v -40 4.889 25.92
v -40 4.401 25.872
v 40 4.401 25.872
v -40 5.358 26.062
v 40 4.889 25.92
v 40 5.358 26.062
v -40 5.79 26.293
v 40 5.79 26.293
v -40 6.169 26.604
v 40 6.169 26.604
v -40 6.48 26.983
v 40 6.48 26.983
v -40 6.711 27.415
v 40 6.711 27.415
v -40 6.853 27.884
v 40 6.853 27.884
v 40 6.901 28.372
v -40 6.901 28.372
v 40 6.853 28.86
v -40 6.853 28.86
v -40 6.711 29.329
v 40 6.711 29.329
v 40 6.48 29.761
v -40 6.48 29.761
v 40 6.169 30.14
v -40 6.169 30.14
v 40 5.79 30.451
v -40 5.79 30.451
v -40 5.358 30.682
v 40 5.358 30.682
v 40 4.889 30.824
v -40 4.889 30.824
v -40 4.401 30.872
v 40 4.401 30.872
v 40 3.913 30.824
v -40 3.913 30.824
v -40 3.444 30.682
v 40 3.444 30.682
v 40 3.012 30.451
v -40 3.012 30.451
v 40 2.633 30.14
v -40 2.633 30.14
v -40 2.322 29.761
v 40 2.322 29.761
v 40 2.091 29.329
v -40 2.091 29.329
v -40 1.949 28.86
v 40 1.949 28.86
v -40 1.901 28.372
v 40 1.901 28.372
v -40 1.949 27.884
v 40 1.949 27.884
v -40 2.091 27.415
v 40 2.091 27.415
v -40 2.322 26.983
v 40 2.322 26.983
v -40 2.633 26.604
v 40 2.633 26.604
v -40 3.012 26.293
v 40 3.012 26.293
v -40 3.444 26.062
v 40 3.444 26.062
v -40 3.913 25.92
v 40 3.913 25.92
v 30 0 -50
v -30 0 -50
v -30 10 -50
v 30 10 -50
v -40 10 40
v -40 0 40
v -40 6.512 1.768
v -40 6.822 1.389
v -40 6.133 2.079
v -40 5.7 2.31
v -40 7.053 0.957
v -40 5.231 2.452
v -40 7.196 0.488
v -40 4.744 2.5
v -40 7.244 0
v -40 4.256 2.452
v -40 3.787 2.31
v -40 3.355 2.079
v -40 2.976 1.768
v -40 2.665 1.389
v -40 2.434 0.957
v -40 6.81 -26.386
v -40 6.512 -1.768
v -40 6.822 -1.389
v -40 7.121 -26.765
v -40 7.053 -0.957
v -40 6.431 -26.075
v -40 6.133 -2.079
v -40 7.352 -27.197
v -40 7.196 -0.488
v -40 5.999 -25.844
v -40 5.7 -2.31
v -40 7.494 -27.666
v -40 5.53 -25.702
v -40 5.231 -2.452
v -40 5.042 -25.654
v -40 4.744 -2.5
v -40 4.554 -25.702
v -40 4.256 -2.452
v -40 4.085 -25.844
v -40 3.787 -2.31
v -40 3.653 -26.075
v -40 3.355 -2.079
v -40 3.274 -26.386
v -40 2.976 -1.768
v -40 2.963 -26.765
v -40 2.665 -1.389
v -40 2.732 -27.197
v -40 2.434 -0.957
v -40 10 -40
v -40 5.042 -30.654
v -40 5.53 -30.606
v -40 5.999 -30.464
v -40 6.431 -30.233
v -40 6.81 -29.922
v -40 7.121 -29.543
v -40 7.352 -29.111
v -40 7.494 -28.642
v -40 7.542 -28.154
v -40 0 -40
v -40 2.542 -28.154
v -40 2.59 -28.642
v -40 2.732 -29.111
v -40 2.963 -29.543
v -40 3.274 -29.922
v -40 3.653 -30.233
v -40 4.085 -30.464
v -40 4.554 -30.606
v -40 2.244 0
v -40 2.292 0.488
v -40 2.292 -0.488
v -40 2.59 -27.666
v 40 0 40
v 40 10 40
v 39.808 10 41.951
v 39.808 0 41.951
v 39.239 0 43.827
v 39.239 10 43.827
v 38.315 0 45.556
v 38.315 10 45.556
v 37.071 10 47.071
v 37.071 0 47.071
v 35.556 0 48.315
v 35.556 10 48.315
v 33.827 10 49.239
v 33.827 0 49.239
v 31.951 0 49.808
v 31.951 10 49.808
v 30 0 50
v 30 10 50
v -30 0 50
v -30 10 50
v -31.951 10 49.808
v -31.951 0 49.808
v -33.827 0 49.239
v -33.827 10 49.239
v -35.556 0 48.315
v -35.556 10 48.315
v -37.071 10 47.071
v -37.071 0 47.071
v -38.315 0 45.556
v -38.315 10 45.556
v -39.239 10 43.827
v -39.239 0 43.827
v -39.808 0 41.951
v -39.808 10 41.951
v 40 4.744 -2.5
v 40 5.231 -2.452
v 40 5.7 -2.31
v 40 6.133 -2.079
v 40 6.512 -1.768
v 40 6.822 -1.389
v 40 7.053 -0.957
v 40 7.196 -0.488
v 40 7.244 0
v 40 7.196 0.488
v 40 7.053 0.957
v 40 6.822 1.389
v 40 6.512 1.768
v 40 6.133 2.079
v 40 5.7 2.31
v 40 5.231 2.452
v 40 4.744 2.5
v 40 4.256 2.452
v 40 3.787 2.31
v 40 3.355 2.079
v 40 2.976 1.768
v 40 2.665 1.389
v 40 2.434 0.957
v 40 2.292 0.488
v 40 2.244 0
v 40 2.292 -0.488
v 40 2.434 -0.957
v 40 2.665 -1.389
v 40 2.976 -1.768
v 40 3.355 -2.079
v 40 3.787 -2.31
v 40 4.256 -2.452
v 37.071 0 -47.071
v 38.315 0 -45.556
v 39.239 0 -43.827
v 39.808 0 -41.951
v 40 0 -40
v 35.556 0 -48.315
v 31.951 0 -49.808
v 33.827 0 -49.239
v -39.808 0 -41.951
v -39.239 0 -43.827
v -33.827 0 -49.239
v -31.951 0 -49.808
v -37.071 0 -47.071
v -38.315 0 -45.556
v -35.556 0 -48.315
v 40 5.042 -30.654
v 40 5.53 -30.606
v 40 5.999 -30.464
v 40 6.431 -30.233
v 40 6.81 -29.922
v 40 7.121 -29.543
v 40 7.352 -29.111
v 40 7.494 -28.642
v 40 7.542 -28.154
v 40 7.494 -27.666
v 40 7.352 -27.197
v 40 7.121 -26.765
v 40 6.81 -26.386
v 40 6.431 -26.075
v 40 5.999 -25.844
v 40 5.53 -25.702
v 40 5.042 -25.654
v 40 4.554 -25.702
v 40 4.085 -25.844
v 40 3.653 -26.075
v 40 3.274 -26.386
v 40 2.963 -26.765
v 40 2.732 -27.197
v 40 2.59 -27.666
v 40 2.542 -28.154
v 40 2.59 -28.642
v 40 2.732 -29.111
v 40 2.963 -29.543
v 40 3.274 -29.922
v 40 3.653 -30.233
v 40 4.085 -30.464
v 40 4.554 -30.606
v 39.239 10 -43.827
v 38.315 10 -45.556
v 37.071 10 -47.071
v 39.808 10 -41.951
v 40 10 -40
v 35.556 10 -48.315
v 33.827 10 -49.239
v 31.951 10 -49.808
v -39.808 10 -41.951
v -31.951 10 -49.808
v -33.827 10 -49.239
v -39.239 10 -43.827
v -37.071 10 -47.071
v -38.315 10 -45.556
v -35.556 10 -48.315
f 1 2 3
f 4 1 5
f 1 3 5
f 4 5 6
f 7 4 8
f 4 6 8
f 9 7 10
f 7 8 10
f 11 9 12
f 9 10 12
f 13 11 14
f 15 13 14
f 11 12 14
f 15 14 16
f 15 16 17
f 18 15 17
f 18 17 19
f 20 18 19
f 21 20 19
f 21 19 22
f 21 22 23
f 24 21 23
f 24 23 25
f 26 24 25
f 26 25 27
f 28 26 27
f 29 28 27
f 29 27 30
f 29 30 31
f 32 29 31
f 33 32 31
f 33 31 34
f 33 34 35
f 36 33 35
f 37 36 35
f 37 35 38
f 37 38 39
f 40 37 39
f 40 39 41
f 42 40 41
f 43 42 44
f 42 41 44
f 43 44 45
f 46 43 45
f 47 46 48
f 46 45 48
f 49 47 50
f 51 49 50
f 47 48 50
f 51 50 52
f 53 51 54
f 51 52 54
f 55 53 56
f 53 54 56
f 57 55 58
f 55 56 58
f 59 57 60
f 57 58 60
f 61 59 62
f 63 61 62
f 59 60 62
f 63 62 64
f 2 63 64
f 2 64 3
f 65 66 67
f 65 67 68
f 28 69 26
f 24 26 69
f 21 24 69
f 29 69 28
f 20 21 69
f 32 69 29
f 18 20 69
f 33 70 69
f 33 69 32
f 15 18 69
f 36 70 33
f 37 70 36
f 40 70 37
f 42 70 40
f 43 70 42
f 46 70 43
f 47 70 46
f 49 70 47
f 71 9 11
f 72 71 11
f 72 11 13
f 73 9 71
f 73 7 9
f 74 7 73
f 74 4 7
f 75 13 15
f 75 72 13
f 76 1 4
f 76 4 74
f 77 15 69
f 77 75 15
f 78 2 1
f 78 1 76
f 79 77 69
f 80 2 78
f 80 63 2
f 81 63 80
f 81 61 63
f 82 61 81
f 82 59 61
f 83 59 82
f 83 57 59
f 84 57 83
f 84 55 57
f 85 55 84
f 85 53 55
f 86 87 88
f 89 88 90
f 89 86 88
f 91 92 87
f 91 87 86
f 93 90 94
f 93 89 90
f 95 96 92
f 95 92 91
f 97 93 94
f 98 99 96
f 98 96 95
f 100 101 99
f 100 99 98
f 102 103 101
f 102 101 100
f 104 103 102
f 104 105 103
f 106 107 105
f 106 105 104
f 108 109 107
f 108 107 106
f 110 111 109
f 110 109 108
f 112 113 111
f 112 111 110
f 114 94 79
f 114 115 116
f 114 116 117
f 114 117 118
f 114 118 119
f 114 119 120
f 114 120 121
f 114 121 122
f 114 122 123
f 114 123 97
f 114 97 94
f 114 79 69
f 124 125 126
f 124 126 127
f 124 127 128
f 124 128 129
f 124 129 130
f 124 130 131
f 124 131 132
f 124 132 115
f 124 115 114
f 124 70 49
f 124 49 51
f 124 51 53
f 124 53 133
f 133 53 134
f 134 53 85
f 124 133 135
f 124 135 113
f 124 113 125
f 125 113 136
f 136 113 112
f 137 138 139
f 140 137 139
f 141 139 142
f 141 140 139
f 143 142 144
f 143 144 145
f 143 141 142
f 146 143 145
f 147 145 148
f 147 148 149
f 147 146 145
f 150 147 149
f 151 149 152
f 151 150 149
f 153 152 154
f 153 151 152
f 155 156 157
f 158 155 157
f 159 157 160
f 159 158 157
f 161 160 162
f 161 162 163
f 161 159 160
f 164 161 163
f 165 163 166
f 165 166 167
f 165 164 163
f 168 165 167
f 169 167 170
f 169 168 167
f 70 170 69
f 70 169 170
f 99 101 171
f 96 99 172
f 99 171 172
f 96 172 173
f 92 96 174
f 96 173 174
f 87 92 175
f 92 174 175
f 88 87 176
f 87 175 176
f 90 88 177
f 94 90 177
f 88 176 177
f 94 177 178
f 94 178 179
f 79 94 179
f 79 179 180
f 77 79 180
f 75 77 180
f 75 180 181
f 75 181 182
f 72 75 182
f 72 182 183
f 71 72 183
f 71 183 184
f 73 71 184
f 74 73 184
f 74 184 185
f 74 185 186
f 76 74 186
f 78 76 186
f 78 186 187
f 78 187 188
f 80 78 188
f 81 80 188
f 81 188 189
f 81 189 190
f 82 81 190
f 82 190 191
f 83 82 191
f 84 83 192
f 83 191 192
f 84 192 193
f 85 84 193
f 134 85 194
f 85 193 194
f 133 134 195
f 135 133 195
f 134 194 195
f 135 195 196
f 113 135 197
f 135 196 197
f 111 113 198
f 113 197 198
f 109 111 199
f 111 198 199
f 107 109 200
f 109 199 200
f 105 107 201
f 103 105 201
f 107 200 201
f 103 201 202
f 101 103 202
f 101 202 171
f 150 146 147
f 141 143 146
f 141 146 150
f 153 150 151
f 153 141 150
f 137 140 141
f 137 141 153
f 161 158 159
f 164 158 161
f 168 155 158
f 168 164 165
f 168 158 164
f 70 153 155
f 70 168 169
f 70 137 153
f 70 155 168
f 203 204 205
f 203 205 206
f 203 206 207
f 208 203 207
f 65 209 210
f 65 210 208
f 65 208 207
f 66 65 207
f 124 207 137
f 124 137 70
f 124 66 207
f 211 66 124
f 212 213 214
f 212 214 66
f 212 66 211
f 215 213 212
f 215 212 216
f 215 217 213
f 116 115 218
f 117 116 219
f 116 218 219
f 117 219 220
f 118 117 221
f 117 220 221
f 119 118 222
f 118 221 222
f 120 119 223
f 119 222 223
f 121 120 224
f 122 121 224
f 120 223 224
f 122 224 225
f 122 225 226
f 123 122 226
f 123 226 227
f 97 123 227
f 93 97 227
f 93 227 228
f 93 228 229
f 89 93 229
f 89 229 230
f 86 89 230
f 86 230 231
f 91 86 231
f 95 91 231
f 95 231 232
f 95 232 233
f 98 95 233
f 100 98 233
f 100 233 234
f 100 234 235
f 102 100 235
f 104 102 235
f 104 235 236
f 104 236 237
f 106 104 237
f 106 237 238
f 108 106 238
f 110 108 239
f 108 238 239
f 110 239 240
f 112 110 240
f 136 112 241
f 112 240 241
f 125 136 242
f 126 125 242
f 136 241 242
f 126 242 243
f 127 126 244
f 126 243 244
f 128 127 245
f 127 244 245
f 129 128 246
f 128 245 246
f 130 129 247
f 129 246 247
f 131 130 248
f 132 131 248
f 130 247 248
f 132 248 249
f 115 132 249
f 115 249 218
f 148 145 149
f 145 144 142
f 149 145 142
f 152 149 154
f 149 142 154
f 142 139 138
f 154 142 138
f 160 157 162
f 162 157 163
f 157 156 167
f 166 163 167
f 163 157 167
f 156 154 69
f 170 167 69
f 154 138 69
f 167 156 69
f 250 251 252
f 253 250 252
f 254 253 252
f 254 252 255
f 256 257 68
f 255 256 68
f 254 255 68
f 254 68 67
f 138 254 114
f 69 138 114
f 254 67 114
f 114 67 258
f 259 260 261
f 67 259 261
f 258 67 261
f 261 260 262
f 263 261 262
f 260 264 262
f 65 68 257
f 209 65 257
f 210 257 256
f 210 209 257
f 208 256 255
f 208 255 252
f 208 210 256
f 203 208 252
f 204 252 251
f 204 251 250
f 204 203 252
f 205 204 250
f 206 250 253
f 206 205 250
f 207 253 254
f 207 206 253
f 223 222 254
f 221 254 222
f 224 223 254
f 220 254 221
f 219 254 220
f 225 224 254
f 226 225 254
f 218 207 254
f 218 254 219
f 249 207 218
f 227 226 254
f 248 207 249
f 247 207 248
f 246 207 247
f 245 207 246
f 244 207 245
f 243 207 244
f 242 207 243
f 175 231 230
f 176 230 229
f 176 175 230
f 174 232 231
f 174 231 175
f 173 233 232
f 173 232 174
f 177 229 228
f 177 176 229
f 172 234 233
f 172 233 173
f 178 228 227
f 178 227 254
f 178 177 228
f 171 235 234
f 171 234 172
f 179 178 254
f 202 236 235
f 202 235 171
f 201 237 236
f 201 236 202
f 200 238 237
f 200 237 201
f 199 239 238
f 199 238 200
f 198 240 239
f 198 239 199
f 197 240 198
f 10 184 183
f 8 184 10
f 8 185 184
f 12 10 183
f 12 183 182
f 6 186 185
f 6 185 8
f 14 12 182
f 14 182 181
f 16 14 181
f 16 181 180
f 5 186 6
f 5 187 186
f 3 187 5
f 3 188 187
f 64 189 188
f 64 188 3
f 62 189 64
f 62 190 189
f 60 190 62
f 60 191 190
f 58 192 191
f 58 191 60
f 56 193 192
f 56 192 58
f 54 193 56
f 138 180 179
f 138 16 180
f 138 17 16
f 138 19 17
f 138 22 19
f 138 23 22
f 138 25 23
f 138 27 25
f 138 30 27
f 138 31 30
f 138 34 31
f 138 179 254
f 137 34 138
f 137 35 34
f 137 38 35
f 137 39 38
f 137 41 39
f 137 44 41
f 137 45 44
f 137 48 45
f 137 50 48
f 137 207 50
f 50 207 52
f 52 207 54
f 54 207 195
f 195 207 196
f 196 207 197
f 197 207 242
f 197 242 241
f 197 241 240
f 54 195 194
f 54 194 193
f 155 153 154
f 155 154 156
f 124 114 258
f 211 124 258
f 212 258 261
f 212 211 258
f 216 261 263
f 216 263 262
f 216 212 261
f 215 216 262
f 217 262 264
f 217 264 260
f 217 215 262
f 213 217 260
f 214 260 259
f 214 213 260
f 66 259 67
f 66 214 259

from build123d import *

# Parameters (mm, degrees)
BOSS_EXTRUDE1_DEPTH = 10
SKETCH2_R           = 2.5
CUT_EXTRUDE1_DEPTH  = 95.868329805
SKETCH4_R           = 2.5
CUT_EXTRUDE2_DEPTH  = 95.868329805
SKETCH5_R           = 2.5
CUT_EXTRUDE3_DEPTH  = 95.868329805


with BuildPart() as part:
    # Sketch1 → Boss-Extrude1 (new body)
    with BuildSketch(Plane(origin=(0, 0, 0), x_dir=(1, 0, 0), z_dir=(0, 1, 0))):
        with BuildLine():
            Line((-30, 50), (30, 50))
            ThreePointArc((30, 50), (37.071067812, 47.071067812), (40, 40))
            Line((40, 40), (40, -40))
            ThreePointArc((40, -40), (37.071067812, -47.071067812), (30, -50))
            Line((30, -50), (-30, -50))
            ThreePointArc((-30, -50), (-37.071067812, -47.071067812), (-40, -40))
            Line((-40, -40), (-40, 40))
            ThreePointArc((-40, 40), (-37.071067812, 47.071067812), (-30, 50))
        make_face()
    extrude(amount=BOSS_EXTRUDE1_DEPTH)

    # Sketch2 → Cut-Extrude1 (cut, through all)
    with BuildSketch(Plane(origin=(40, 0, 0), x_dir=(0, 0, -1), z_dir=(1, 0, 0))):
        with Locations((0, 4.743756571)):
            Circle(SKETCH2_R)
    extrude(amount=-CUT_EXTRUDE1_DEPTH, mode=Mode.SUBTRACT)

    # Sketch4 → Cut-Extrude2 (cut, through all)
    with BuildSketch(Plane(origin=(40, 0, 0), x_dir=(0, 0, -1), z_dir=(1, 0, 0))):
        with Locations((-28.371833373, 4.400978566)):
            Circle(SKETCH4_R)
    extrude(amount=-CUT_EXTRUDE2_DEPTH, mode=Mode.SUBTRACT)

    # Sketch5 → Cut-Extrude3 (cut, through all)
    with BuildSketch(Plane(origin=(40, 0, 0), x_dir=(0, 0, -1), z_dir=(1, 0, 0))):
        with Locations((28.154007397, 5.042029154)):
            Circle(SKETCH5_R)
    extrude(amount=-CUT_EXTRUDE3_DEPTH, mode=Mode.SUBTRACT)


solid = part.part
